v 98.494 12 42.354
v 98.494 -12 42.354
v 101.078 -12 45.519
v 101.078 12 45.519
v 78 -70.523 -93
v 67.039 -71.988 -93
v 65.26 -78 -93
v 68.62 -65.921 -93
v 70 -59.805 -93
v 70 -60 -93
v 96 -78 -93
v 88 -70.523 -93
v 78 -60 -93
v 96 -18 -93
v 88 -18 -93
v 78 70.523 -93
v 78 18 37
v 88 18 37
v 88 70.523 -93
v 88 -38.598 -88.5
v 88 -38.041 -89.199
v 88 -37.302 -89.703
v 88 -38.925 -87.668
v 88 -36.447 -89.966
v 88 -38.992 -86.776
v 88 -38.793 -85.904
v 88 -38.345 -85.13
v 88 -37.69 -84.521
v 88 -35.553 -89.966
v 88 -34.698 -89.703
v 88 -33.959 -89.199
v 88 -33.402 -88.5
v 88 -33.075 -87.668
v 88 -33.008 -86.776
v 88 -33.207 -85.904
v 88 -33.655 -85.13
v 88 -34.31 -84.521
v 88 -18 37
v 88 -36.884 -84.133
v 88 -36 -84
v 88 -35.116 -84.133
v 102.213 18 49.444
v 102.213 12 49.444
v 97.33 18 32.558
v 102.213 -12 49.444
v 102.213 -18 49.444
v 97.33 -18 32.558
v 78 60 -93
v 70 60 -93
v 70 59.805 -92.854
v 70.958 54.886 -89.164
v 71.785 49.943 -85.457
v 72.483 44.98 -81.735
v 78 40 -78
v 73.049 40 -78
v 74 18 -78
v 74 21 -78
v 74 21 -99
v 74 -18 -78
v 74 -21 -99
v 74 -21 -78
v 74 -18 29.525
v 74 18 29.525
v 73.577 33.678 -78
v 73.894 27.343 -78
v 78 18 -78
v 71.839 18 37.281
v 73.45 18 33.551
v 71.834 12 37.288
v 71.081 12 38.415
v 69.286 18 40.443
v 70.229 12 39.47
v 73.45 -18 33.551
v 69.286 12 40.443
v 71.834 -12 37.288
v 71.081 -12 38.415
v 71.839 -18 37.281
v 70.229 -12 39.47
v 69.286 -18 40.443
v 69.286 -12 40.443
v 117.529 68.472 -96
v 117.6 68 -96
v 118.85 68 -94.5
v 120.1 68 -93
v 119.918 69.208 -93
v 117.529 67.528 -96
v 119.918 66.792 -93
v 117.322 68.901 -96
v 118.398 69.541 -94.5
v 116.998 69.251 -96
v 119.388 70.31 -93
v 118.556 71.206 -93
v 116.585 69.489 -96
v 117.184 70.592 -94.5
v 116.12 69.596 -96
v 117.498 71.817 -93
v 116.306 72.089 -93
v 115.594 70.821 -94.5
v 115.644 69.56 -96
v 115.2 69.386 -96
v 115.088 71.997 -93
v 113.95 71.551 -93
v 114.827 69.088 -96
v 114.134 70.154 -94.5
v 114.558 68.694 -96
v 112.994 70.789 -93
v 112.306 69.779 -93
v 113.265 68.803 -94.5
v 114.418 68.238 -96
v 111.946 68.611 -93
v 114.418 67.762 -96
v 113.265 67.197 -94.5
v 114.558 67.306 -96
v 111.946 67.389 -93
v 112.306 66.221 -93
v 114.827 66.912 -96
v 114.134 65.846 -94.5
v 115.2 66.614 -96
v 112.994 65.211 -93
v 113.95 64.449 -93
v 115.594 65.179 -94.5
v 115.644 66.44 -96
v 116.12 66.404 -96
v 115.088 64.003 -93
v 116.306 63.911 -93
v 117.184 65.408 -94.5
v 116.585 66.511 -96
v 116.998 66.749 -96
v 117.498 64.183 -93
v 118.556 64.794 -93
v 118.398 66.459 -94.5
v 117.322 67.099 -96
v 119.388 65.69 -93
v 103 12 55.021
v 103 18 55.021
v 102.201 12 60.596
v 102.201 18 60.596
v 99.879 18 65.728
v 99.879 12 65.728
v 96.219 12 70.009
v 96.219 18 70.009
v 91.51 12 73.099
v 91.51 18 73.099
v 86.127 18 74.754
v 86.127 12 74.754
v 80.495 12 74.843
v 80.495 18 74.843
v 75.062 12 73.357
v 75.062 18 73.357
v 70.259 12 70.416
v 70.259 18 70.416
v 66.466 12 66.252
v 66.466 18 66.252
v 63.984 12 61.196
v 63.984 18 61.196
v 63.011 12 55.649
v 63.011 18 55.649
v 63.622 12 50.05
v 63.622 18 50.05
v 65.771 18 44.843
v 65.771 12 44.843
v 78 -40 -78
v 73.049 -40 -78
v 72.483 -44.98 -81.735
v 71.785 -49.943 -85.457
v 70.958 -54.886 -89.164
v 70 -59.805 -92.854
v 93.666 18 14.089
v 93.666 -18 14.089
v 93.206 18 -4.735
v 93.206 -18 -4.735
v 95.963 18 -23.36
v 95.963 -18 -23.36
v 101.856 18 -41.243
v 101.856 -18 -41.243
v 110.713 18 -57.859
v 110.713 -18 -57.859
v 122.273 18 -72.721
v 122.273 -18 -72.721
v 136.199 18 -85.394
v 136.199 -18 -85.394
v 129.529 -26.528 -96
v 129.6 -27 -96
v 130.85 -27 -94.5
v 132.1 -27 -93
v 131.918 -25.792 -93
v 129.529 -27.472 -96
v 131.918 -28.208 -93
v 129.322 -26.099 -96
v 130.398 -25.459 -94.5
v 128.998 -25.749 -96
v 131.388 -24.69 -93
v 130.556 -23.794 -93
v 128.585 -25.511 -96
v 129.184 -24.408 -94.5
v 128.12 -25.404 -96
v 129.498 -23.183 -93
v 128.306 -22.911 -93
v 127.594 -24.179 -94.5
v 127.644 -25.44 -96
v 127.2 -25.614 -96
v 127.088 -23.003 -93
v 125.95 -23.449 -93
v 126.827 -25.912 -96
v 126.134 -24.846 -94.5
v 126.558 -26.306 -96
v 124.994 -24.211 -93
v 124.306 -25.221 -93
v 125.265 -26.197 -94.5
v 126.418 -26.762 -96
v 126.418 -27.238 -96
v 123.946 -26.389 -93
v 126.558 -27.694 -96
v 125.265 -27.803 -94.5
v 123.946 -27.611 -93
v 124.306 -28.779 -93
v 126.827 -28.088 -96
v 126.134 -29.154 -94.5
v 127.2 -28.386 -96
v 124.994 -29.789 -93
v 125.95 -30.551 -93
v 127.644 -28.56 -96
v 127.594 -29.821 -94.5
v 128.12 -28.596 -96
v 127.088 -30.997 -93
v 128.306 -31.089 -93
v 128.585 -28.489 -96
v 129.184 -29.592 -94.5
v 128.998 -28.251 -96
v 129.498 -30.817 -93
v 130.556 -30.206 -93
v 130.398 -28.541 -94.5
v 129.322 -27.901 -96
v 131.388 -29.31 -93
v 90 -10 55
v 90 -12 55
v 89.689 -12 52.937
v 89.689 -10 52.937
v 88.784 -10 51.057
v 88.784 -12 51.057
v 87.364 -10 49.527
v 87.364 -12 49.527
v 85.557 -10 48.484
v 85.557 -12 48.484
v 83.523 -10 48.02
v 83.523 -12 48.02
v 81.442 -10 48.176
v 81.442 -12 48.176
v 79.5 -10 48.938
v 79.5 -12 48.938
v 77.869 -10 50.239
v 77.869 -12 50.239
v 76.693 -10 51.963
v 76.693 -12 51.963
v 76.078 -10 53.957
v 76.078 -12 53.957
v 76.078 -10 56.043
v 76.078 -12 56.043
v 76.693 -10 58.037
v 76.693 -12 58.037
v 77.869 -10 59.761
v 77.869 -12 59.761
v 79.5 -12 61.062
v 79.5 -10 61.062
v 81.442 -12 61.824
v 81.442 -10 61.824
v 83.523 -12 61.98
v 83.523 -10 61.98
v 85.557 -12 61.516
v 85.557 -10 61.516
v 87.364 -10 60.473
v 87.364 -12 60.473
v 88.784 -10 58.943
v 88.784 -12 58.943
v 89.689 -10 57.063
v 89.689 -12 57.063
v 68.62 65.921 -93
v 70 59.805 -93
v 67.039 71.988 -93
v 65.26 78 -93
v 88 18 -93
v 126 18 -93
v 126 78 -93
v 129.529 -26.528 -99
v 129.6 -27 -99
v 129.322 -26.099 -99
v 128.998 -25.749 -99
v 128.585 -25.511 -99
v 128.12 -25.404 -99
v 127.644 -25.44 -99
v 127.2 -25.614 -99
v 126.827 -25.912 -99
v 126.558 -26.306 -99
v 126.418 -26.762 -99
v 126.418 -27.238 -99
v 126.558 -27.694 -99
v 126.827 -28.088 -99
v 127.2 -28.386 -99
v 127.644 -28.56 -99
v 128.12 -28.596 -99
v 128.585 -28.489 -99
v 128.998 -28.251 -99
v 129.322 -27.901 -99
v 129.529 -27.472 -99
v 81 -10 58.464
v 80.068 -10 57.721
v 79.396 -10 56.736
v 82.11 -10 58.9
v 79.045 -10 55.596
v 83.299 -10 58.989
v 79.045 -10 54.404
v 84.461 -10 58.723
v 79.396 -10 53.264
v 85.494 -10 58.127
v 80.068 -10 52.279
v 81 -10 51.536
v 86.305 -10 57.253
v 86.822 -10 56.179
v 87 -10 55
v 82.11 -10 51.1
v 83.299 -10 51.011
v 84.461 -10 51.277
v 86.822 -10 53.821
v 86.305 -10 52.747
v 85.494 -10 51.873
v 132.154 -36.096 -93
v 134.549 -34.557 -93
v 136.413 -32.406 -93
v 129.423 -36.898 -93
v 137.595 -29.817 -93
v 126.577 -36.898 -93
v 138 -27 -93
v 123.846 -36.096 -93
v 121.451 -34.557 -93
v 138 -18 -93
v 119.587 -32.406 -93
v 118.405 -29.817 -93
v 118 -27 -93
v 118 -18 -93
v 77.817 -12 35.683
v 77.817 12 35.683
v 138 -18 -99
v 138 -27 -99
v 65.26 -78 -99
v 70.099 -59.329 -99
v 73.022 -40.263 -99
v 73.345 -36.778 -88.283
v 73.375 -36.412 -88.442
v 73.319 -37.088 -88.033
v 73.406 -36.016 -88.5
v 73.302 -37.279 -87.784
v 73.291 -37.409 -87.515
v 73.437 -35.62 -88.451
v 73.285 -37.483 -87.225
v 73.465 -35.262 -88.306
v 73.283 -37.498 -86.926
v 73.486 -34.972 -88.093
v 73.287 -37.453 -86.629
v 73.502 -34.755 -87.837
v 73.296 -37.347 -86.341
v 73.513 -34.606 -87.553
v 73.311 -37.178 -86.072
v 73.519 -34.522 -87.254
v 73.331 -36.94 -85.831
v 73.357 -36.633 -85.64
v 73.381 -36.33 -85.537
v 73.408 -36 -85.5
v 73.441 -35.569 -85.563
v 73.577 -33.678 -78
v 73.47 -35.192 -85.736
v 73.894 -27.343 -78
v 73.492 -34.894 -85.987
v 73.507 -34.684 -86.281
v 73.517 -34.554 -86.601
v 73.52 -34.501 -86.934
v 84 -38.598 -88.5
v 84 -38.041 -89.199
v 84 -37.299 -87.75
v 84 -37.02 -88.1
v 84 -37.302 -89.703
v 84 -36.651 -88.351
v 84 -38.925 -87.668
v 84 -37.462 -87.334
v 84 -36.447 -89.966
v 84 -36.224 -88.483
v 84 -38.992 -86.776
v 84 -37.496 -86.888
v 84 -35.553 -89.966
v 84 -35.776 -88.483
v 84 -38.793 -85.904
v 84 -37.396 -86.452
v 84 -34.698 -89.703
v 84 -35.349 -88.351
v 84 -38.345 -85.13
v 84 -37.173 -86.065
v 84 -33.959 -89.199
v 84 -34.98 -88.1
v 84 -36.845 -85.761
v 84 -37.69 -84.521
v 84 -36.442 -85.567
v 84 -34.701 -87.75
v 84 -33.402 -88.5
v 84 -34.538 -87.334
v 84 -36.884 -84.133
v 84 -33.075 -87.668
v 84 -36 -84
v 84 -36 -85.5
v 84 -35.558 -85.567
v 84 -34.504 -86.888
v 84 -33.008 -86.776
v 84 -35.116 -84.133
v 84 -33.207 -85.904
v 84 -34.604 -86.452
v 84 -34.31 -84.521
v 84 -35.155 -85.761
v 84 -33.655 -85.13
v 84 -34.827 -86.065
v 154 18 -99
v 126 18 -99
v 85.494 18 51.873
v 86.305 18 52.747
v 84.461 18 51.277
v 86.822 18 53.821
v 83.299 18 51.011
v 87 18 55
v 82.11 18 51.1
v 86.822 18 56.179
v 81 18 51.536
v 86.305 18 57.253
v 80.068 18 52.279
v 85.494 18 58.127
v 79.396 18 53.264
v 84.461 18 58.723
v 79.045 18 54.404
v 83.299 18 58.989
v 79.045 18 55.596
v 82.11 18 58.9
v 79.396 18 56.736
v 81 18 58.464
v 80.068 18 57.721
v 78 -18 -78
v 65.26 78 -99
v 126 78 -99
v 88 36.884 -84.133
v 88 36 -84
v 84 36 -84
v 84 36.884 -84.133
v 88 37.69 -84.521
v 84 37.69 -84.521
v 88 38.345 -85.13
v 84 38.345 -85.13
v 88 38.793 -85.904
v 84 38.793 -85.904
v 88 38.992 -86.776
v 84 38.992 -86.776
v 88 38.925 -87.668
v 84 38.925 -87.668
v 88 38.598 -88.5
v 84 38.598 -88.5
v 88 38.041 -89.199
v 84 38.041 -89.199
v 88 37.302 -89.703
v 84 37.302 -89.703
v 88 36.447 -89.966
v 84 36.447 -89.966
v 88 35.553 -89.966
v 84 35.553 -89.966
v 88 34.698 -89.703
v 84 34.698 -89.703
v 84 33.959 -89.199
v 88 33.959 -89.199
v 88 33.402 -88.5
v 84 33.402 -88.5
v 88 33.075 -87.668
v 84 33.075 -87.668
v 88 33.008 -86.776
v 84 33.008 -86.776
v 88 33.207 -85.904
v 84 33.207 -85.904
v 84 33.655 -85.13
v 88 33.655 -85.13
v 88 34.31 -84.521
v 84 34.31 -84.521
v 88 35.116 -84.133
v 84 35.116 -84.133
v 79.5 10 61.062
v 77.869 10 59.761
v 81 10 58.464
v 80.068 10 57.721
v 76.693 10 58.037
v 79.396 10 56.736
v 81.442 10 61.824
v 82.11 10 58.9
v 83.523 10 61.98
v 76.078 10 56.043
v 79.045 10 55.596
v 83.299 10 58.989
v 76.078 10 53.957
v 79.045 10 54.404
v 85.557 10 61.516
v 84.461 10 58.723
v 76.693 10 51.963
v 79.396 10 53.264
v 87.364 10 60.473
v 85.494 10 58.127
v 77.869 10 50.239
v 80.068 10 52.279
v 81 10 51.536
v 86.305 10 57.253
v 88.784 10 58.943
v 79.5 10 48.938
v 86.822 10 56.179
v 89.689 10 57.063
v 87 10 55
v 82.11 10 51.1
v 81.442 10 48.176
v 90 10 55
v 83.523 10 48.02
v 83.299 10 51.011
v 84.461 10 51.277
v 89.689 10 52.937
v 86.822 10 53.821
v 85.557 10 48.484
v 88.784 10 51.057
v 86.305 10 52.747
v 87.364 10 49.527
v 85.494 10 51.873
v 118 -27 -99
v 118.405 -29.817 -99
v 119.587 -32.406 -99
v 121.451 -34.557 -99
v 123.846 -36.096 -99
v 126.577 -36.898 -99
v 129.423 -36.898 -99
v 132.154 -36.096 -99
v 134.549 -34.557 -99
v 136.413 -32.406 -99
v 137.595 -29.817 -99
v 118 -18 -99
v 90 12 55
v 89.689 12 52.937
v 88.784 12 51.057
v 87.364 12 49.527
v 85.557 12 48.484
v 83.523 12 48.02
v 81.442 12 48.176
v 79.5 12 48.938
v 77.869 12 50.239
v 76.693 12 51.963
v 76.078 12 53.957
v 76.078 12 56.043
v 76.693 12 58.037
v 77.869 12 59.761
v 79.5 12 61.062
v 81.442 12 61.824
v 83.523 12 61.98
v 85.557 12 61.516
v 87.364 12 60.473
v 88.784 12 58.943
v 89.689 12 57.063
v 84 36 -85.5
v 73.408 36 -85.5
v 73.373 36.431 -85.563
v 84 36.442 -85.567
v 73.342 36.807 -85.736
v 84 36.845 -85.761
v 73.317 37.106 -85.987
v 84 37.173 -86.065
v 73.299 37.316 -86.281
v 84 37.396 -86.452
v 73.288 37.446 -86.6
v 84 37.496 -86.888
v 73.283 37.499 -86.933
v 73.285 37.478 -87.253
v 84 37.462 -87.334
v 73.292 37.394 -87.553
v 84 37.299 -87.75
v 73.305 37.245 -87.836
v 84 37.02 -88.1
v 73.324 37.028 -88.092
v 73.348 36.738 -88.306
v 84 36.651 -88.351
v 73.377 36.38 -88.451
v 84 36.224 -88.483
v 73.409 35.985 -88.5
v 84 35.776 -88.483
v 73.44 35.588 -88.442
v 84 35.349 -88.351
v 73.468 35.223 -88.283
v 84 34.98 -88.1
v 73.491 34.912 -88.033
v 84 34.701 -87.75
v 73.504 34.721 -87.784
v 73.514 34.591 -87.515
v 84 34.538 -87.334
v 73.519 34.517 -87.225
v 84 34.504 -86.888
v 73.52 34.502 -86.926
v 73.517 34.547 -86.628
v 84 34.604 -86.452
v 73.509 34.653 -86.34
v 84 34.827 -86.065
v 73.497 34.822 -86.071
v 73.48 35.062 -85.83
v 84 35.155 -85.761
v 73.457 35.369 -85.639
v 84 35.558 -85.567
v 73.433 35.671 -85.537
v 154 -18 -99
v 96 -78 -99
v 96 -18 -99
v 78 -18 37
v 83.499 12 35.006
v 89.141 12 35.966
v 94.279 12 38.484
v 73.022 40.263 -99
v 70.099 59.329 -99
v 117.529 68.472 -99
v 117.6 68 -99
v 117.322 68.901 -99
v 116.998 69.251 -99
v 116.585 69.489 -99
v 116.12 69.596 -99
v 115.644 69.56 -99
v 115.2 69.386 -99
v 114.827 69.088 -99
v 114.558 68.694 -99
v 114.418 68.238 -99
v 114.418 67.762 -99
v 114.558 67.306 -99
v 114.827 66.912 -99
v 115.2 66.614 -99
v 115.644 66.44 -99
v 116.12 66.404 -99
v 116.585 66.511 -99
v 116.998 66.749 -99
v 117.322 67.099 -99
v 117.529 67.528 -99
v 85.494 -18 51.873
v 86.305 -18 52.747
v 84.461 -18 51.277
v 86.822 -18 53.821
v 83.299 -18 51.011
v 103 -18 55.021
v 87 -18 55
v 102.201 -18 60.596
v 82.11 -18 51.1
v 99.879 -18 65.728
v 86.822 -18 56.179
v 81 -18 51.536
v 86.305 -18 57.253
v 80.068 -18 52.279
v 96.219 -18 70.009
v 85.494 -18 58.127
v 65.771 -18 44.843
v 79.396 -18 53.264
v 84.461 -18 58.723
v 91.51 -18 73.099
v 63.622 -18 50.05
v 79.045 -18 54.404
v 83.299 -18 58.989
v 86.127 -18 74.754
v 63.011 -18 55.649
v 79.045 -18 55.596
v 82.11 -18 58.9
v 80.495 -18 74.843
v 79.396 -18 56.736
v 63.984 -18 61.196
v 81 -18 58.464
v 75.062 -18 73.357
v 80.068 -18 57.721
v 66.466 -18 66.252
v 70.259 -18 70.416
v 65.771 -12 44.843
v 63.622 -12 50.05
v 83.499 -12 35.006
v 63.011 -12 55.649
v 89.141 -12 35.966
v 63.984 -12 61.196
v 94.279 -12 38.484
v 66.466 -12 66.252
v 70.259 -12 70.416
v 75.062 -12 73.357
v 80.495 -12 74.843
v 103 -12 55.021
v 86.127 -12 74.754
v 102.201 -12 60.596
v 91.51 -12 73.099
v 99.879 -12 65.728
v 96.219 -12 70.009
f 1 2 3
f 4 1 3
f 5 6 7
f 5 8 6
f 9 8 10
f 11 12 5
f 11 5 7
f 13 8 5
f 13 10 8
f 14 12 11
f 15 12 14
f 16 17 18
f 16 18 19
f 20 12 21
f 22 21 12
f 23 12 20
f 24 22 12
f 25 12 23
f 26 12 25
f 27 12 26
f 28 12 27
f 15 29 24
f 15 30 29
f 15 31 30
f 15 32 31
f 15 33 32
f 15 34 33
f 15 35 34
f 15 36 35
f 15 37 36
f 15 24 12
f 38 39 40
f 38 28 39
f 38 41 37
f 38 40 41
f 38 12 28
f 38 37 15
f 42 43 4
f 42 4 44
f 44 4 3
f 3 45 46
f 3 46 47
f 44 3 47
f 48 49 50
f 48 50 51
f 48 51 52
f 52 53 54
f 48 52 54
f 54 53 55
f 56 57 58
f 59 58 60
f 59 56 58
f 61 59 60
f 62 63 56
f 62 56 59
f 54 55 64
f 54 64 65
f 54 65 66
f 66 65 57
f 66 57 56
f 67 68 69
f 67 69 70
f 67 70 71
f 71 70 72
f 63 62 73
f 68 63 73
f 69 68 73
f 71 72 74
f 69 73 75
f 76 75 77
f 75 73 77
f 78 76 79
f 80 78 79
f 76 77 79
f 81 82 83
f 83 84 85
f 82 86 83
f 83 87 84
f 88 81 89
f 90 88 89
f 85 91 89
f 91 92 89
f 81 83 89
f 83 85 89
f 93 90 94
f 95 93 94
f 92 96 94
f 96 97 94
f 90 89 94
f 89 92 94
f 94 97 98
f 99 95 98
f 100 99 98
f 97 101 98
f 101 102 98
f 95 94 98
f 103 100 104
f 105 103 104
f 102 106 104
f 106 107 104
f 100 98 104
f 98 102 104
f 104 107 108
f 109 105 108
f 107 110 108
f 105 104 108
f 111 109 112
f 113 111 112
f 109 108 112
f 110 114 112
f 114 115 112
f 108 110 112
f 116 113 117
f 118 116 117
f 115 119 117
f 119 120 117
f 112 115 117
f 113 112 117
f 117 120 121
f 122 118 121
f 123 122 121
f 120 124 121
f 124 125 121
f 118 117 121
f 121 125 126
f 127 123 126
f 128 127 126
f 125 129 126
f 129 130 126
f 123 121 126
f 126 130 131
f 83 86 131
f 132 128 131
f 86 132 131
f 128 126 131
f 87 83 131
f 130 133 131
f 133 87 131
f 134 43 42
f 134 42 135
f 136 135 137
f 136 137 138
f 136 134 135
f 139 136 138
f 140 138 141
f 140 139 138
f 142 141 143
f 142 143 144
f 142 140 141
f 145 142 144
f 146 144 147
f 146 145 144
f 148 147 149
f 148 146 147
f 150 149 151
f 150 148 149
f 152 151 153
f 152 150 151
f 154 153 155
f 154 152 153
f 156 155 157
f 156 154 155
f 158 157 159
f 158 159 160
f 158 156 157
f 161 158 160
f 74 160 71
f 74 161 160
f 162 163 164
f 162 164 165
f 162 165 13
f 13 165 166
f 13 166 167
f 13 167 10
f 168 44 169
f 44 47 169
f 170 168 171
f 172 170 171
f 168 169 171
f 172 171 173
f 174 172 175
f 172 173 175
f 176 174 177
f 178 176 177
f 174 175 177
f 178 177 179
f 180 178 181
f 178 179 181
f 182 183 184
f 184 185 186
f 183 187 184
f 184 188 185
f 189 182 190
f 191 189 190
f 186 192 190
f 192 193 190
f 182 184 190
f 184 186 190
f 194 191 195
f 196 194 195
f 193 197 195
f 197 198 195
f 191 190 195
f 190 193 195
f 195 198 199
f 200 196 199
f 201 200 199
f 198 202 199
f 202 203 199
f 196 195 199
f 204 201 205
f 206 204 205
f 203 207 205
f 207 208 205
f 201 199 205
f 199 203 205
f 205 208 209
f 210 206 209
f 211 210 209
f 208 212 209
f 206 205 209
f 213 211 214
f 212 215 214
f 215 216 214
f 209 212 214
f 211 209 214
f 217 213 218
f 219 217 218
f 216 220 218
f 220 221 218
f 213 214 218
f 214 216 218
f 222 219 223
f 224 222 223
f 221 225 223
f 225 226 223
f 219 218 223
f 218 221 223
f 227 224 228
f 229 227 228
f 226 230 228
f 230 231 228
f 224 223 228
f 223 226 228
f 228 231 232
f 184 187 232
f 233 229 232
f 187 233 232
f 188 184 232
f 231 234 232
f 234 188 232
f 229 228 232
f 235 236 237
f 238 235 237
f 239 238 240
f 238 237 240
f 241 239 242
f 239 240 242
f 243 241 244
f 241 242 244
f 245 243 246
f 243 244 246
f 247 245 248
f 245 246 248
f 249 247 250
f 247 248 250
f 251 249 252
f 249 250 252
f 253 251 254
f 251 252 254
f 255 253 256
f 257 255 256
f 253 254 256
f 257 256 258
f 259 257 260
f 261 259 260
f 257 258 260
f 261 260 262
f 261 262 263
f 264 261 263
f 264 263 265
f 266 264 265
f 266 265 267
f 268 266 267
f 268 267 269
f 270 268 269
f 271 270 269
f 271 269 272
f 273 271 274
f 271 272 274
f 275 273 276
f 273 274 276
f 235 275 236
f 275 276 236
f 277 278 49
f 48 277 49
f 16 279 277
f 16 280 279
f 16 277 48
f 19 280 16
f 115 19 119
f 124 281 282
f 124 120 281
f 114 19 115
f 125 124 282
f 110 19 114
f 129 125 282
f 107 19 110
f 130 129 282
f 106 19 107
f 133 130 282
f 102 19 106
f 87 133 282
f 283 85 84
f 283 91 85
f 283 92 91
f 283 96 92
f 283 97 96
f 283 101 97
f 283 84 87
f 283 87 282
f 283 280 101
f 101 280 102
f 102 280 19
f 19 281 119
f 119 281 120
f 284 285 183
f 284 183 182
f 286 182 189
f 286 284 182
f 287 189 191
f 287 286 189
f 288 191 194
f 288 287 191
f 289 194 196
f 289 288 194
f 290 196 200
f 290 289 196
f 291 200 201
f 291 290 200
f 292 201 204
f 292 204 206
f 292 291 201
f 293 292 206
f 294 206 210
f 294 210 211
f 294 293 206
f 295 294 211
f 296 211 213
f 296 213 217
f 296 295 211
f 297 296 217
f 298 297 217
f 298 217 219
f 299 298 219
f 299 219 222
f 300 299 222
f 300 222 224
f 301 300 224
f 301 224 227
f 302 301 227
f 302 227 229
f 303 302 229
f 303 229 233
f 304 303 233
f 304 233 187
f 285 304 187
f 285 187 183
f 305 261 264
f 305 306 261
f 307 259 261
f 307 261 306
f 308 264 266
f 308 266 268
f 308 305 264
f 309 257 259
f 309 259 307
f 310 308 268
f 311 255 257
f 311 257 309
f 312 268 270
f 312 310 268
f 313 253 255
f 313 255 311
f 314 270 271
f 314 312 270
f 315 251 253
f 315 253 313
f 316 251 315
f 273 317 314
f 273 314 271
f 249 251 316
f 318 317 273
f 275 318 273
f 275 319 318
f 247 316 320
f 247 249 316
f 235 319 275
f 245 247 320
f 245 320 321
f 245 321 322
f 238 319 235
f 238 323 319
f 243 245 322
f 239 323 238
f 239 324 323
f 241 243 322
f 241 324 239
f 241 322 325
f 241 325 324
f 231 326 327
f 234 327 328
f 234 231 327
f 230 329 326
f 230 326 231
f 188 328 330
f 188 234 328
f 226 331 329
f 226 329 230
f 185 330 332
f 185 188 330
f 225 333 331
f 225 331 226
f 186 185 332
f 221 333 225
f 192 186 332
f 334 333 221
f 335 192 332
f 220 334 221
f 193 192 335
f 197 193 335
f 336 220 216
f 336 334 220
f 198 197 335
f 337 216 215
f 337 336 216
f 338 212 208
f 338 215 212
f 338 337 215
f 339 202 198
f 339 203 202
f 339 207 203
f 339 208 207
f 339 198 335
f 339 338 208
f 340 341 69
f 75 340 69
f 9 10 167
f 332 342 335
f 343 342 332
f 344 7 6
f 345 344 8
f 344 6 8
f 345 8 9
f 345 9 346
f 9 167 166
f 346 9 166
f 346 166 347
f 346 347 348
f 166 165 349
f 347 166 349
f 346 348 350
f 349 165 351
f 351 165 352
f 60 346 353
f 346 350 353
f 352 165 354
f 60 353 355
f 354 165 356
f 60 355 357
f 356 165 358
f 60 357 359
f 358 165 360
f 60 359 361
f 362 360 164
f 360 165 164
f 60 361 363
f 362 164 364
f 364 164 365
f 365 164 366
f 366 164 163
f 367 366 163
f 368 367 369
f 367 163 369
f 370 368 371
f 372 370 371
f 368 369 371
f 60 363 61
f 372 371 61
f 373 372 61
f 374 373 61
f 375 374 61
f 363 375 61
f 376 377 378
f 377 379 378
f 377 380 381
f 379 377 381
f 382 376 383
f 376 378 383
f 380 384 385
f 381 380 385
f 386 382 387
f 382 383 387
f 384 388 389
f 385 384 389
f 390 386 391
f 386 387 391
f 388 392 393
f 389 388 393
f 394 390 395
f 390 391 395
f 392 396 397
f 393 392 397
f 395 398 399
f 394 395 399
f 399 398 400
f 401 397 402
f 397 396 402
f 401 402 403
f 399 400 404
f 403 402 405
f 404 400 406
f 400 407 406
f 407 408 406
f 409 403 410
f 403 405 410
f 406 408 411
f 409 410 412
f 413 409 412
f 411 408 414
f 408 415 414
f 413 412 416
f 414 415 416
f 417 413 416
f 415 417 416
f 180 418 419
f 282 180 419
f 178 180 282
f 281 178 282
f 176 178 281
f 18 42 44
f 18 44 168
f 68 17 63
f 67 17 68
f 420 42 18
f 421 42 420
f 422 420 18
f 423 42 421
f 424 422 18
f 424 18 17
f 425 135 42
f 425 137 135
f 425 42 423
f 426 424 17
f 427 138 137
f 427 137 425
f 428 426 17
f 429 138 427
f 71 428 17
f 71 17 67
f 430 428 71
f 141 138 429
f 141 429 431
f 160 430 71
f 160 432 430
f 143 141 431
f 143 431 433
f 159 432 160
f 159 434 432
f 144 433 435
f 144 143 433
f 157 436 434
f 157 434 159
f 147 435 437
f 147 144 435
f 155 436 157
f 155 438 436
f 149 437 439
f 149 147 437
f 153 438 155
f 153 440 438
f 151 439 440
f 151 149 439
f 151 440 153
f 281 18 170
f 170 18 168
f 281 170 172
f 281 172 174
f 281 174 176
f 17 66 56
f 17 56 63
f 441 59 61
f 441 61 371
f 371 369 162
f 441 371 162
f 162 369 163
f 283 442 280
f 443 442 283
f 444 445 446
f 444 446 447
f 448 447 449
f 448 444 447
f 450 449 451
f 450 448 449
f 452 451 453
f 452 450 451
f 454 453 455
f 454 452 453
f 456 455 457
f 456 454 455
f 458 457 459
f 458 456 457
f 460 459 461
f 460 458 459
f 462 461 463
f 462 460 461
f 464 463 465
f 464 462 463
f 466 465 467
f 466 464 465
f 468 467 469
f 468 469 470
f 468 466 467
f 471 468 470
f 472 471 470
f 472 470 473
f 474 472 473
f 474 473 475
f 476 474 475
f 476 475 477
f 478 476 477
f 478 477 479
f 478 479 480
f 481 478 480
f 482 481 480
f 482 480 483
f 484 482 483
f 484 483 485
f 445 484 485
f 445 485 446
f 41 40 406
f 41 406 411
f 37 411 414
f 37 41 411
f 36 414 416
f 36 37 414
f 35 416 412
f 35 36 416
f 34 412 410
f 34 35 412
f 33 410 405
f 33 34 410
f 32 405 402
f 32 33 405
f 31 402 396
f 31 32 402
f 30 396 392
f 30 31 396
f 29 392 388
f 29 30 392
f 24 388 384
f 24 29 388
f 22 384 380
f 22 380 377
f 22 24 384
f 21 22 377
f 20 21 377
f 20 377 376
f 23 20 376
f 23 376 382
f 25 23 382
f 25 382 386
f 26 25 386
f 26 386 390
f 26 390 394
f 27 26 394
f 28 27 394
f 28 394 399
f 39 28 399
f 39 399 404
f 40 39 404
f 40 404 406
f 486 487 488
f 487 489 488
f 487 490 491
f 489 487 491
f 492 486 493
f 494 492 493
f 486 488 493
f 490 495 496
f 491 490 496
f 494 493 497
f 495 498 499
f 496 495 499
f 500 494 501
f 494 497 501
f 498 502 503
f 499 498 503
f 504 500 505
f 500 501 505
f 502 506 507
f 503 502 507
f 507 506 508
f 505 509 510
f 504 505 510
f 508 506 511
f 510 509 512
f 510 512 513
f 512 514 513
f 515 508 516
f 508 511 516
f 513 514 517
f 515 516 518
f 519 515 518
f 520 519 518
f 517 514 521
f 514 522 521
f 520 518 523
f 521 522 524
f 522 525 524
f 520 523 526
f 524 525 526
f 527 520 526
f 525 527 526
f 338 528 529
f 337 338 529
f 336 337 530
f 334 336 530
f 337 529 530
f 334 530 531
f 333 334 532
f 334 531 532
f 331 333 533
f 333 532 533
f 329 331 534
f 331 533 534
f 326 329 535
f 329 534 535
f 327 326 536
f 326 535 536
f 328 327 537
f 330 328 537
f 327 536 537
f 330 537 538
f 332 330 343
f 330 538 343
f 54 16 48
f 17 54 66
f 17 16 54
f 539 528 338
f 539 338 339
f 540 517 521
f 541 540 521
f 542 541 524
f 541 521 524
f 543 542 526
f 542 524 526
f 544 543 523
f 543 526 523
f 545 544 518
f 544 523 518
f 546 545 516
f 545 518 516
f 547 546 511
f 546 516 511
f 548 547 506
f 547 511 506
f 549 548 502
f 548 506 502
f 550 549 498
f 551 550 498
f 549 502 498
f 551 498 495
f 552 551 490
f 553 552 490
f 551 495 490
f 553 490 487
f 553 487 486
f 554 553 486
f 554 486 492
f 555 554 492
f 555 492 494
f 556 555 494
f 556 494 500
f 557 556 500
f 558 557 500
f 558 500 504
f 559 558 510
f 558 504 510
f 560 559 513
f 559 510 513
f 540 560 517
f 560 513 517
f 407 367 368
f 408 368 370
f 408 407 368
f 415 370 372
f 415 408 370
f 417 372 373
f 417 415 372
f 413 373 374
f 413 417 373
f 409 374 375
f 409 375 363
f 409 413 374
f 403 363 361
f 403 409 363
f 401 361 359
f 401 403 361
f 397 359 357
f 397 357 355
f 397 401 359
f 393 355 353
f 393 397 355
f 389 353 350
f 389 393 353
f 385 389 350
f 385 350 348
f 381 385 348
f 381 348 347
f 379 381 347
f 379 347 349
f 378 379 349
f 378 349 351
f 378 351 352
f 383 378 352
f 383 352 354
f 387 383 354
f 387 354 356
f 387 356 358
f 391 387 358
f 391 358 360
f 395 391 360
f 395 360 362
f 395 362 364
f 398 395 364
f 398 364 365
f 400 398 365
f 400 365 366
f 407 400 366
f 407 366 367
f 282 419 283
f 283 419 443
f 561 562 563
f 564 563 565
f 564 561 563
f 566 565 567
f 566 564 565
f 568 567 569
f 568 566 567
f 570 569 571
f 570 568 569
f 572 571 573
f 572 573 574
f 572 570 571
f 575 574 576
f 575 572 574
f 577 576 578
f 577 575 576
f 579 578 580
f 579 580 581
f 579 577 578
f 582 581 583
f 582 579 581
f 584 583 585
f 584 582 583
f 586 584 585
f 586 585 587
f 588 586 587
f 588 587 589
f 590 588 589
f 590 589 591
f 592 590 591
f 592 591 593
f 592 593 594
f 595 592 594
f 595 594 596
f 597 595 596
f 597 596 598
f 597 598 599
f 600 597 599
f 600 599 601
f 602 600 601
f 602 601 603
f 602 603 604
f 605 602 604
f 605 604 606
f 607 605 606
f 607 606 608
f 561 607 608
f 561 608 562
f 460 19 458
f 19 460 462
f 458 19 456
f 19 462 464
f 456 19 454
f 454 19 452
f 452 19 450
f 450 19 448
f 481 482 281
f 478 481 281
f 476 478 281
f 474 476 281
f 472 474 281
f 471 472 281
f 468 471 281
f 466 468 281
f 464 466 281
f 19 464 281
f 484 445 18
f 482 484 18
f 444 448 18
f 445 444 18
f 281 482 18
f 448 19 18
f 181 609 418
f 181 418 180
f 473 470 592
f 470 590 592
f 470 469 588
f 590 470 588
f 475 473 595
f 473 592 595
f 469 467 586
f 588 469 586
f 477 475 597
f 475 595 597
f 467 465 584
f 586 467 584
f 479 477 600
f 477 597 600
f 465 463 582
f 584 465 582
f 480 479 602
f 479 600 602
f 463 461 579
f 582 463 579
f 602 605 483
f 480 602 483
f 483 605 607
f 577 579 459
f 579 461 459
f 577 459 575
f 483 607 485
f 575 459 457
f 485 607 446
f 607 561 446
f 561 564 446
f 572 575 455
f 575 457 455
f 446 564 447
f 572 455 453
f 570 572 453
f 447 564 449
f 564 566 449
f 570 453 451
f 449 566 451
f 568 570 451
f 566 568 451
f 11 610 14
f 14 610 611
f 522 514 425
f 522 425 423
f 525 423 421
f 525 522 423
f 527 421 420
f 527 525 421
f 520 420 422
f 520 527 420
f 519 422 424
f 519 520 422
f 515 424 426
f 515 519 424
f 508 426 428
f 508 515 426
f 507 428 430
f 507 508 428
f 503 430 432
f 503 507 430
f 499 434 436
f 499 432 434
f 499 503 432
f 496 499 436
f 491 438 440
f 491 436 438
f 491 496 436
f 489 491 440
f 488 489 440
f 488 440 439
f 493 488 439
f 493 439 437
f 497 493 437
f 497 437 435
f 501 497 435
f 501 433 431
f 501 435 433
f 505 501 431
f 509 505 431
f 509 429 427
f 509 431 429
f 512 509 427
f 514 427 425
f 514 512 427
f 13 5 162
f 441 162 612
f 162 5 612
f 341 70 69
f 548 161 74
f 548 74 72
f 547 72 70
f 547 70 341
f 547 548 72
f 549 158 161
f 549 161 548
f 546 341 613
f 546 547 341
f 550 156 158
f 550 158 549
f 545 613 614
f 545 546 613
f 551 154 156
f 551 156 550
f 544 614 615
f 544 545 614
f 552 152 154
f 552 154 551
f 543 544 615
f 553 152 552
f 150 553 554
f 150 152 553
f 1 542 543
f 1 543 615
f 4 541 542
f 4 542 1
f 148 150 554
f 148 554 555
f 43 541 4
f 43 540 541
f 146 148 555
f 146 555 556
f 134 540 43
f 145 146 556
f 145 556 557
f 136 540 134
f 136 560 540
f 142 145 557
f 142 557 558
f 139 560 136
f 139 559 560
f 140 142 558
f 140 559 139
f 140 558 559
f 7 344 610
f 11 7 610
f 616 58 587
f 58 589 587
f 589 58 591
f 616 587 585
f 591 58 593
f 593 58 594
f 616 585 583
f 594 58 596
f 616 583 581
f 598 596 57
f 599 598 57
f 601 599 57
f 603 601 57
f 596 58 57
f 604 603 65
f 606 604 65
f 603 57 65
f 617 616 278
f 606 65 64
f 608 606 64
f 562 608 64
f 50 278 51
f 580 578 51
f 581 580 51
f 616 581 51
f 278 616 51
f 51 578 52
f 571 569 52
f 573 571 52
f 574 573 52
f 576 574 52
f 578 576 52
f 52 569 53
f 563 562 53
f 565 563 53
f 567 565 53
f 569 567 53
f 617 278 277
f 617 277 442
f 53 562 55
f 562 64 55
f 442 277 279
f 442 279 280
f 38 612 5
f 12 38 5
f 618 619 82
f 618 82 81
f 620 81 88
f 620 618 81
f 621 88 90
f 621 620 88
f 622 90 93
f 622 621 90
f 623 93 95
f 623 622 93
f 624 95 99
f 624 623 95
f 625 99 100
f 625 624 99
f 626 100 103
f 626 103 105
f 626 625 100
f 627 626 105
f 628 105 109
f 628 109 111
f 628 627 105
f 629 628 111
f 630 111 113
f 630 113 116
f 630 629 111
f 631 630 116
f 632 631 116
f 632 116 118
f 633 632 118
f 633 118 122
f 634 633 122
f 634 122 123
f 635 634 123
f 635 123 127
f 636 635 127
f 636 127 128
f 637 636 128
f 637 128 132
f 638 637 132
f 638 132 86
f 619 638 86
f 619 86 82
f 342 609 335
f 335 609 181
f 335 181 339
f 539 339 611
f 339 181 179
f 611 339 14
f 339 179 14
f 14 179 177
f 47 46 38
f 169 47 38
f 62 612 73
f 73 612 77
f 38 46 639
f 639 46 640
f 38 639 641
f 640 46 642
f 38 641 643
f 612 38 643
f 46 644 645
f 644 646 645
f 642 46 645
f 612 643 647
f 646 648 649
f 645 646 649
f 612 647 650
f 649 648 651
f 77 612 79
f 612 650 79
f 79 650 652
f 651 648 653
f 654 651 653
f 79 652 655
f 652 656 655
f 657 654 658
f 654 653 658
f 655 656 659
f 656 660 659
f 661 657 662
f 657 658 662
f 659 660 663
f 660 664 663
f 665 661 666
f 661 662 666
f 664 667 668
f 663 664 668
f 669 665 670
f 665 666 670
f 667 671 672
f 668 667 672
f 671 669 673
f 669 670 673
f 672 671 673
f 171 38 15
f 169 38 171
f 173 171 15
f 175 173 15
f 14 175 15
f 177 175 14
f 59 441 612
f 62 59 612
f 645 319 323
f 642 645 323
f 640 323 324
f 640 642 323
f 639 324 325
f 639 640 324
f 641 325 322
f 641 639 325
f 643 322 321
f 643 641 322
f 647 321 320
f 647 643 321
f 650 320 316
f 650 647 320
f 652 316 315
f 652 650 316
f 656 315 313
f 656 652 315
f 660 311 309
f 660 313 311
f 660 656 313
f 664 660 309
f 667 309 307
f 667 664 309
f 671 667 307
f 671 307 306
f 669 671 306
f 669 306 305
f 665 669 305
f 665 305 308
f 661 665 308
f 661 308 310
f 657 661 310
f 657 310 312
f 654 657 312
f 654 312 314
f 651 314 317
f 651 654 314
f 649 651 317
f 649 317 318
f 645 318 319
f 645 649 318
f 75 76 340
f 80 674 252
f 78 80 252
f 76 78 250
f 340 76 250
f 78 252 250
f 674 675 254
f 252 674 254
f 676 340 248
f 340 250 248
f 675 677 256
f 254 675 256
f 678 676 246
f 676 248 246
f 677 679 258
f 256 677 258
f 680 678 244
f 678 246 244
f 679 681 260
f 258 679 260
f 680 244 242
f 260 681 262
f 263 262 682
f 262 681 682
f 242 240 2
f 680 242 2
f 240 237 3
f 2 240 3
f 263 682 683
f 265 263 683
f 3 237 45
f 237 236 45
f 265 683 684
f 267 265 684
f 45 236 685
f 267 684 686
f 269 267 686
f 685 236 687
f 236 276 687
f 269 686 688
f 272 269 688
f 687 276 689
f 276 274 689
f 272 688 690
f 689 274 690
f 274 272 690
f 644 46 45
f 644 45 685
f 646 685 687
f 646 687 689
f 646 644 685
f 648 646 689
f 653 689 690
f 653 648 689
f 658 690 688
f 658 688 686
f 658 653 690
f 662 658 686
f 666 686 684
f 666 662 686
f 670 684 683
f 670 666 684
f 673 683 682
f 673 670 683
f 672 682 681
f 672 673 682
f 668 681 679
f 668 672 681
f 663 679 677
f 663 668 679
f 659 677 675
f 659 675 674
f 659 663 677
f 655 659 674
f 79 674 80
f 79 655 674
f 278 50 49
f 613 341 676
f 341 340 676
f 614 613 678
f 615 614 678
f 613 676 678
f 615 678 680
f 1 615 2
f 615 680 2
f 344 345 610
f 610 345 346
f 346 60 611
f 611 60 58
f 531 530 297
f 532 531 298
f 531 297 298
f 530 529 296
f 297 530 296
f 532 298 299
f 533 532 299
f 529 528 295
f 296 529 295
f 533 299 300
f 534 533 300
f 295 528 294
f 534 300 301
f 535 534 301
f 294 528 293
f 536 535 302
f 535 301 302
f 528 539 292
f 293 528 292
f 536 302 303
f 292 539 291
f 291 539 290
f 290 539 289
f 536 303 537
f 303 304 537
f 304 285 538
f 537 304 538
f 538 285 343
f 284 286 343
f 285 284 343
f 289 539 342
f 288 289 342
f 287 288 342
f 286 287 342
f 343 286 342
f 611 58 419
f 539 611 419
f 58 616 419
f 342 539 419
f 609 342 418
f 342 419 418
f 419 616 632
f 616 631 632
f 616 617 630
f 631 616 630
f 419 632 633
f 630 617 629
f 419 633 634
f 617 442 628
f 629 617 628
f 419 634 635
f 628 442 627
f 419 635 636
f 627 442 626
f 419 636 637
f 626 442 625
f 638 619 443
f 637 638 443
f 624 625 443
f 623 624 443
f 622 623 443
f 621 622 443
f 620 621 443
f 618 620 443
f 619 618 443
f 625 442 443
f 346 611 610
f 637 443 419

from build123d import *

# Parameters (mm, degrees)
CYLINDER059_R              = 1.5
CYLINDER059_DEPTH          = 45
CYLINDER060_R              = 1.5
CYLINDER060_DEPTH          = 45
PRISM006_DEPTH             = 3
PRISM007_DEPTH             = 3
CYLINDER061_R              = 3
CYLINDER061_DEPTH          = 5
CYLINDER043_R              = 4
CYLINDER043_DEPTH          = 40
CYLINDER045_R              = 7
CYLINDER045_DEPTH          = 2
CYLINDER044_R              = 7
CYLINDER044_DEPTH          = 2
EXTRUDE010_DEPTH           = 12
EXTRUDE023_DEPTH           = 24
CYLINDER046_R              = 1.6
CYLINDER046_DEPTH          = 10
CYLINDER062_R              = 3
CYLINDER062_DEPTH          = 5
BOX012_W                   = 31
BOX012_H                   = 60
BOX012_DEPTH               = 6
BOX011_W                   = 61
BOX011_H                   = 60
BOX011_DEPTH               = 6
EXTRUDE015_DEPTH           = 6
EXTRUDE015_PLACEMENT_ANGLE = 90
EXTRUDE011_DEPTH           = 10
EXTRUDE024_DEPTH           = 10
EXTRUDE009_DEPTH           = 18


with BuildPart() as cilindro059:
    # Cylinder059 → Cylinder059 (new body)
    with BuildSketch(Plane(origin=(98, -36, -87), x_dir=(0, 0, 1), z_dir=(-1, 0, 0))):
        Circle(CYLINDER059_R)
    extrude(amount=CYLINDER059_DEPTH)


with BuildPart() as cilindro060:
    # Cylinder060 → Cylinder060 (new body)
    with BuildSketch(Plane(origin=(98, 36, -87), x_dir=(0, 0, 1), z_dir=(-1, 0, 0))):
        Circle(CYLINDER060_R)
    extrude(amount=CYLINDER060_DEPTH)


with BuildPart() as prisma006:
    # Prism006 → Prism006 (new body)
    with BuildSketch(Plane(origin=(65, -36, -87), x_dir=(0, 0, 1), z_dir=(-1, 0, 0))):
        Polygon((3, 0), (1.5, 2.598076), (-1.5, 2.598076), (-3, 0), (-1.5, -2.598076), (1.5, -2.598076), align=None)
    extrude(amount=PRISM006_DEPTH)


with BuildPart() as prisma007:
    # Prism007 → Prism007 (new body)
    with BuildSketch(Plane(origin=(65, 36, -87), x_dir=(0, 0, 1), z_dir=(-1, 0, 0))):
        Polygon((3, 0), (1.5, 2.598076), (-1.5, 2.598076), (-3, 0), (-1.5, -2.598076), (1.5, -2.598076), align=None)
    extrude(amount=PRISM007_DEPTH)


with BuildPart() as cilindro061:
    # Cylinder061 → Cylinder061 (new body)
    with BuildSketch(Plane(origin=(89, -36, -87), x_dir=(0, 0, 1), z_dir=(-1, 0, 0))):
        Circle(CYLINDER061_R)
    extrude(amount=CYLINDER061_DEPTH)


with BuildPart() as cilindro043:
    # Cylinder043 → Cylinder043 (new body)
    with BuildSketch(Plane(origin=(83, -20, 55), x_dir=(1, 0, 0), z_dir=(0, 1, 0))):
        Circle(CYLINDER043_R)
    extrude(amount=CYLINDER043_DEPTH)


with BuildPart() as cilindro045:
    # Cylinder045 → Cylinder045 (new body)
    with BuildSketch(Plane(origin=(83, 10, 55), x_dir=(1, 0, 0), z_dir=(0, 1, 0))):
        Circle(CYLINDER045_R)
    extrude(amount=CYLINDER045_DEPTH)


with BuildPart() as fusion020:
    # Cylinder044 → Cylinder044 (new body)
    with BuildSketch(Plane(origin=(83, -12, 55), x_dir=(1, 0, 0), z_dir=(0, 1, 0))):
        Circle(CYLINDER044_R)
    extrude(amount=CYLINDER044_DEPTH)

    # Fusion020: union Cilindro045
    add(cilindro045.part)


with BuildPart() as cut012:
    # Sketch010 → Extrude010 (new body, symmetric)
    with BuildSketch(Plane.XZ):
        with BuildLine():
            ThreePointArc((77.817442, 35.68314), (89.140517, 35.965977), (98.494144, 42.353597))
            Line((98.494144, 42.353597), (108, 54))
            Line((108, 54), (108, 85))
            Line((58, 85), (108, 85))
            Line((58, 41), (58, 85))
            Line((77.817442, 35.68314), (58, 41))
        make_face()
    extrude(amount=EXTRUDE010_DEPTH, both=True)

    # Cut012: cut Fusion020
    add(fusion020.part, mode=Mode.SUBTRACT)


with BuildPart() as extrude023:
    # Sketch015 → Extrude023 (new body)
    with BuildSketch(Plane.XY.offset(-75)):
        with BuildLine():
            Line((-74, 21), (-74, -21))
            ThreePointArc((-74, -21), (-67.384986, -70.729267), (-48, -117))
            Line((-48, -117), (48, -117))
            ThreePointArc((48, -117), (67.384986, -70.729267), (74, -21))
            Line((74, 21), (74, -21))
            ThreePointArc((74, 21), (67.384986, 70.729267), (48, 117))
            Line((-48, 117), (48, 117))
            ThreePointArc((-48, 117), (-67.384986, 70.729267), (-74, 21))
        make_face()
    extrude(amount=-EXTRUDE023_DEPTH)


with BuildPart() as cono:
    # Cone → Cone (revolve)
    with BuildSketch(Plane(origin=(0, 0, -96), x_dir=(1, 0, 0), z_dir=(0, -1, 0))):
        Polygon((0, 0), (1.6, 0), (4.1, 3), (0, 3), align=None)
    revolve(axis=Axis((0, 0, -96), (0, 0, 1)))


with BuildPart() as cilindro046:
    # Cylinder046 → Cylinder046 (new body)
    with BuildSketch(Plane.XY.offset(-106)):
        Circle(CYLINDER046_R)
    extrude(amount=CYLINDER046_DEPTH)


with BuildPart() as fusion029:
    # Fusion029 base: copy of Cilindro046
    add(cilindro046.part)

    # Fusion029: union Cono
    add(cono.part)


with BuildPart() as fusion029_1:
    # Fusion029 placement: moved
    add(fusion029.part.moved(Location((128, -27, 0))))


with BuildPart() as fusion028:
    # Fusion028 base: copy of Cilindro046
    add(cilindro046.part)

    # Fusion028: union Cono
    add(cono.part)


with BuildPart() as fusion028_1:
    # Fusion028 placement: moved
    add(fusion028.part.moved(Location((116, 68, 0))))


with BuildPart() as fusion052:
    # Cylinder062 → Cylinder062 (new body)
    with BuildSketch(Plane(origin=(89, 36, -87), x_dir=(0, 0, 1), z_dir=(-1, 0, 0))):
        Circle(CYLINDER062_R)
    extrude(amount=CYLINDER062_DEPTH)

    # Fusion052: union Cilindro059, Cilindro060, Prisma006, Prisma007, Cilindro061, Cilindro043, Cut012, Extrude023, Fusion029, Fusion028
    add(cilindro059.part)
    add(cilindro060.part)
    add(prisma006.part)
    add(prisma007.part)
    add(cilindro061.part)
    add(cilindro043.part)
    add(cut012.part)
    add(extrude023.part)
    add(fusion029_1.part)
    add(fusion028_1.part)


with BuildPart() as cubo011:
    # Box012 → Box012 (new body)
    with BuildSketch(Plane(origin=(65, -78, -99), x_dir=(1, 0, 0), z_dir=(0, 0, 1))):
        with Locations((15.5, 30)):
            Rectangle(BOX012_W, BOX012_H)
    extrude(amount=BOX012_DEPTH)


with BuildPart() as cubo010:
    # Box011 → Box011 (new body)
    with BuildSketch(Plane(origin=(65, 18, -99), x_dir=(1, 0, 0), z_dir=(0, 0, 1))):
        with Locations((30.5, 30)):
            Rectangle(BOX011_W, BOX011_H)
    extrude(amount=BOX011_DEPTH)


with BuildPart() as fusion024:
    # Sketch012 → Extrude015 (new body)
    with BuildSketch(Plane.XY.offset(-99)):
        with BuildLine():
            ThreePointArc((0, 10), (-10, 0), (0, -10))
            Line((20, -10), (0, -10))
            Line((20, 10), (20, -10))
            Line((0, 10), (20, 10))
        make_face()
    extrude(amount=EXTRUDE015_DEPTH)


with BuildPart() as fusion024_1:
    # Extrude015 placement: moved
    add(fusion024.part.moved(Location((128, -27, 0))).rotate(Axis((128, -27, 0), (0, 0, 1)), EXTRUDE015_PLACEMENT_ANGLE))

    # Fusion024: union Cubo011, Cubo010
    add(cubo011.part)
    add(cubo010.part)


with BuildPart() as extrude011:
    # Sketch011 → Extrude011 (new body)
    with BuildSketch(Plane.YZ.offset(78)):
        Polygon((-70.523409, -93), (-18, -93), (-18, 37), align=None)
        Polygon((18, -93), (18, 37), (70.523409, -93), align=None)
    extrude(amount=EXTRUDE011_DEPTH)


with BuildPart() as extrude024:
    # Sketch016 → Extrude024 (new body)
    with BuildSketch(Plane.YZ.offset(70)):
        Polygon((-40, -78), (-60, -93), (60, -93), (40, -78), align=None)
    extrude(amount=EXTRUDE024_DEPTH)


with BuildPart() as soporte_eje:
    # Sketch009 → Extrude009 (new body, symmetric)
    with BuildSketch(Plane.XZ):
        with BuildLine():
            Line((74, -99), (74, 29.524522))
            ThreePointArc((74, 29.524522), (72.771088, 35.470709), (69.285714, 40.442584))
            ThreePointArc((102.212801, 49.444079), (77.725993, 74.292093), (69.285714, 40.442584))
            Line((102.212801, 49.444079), (97.329592, 32.557567))
            ThreePointArc((97.329592, 32.557567), (98.526548, -32.428153), (136.199214, -85.393678))
            Line((154, -99), (136.199214, -85.393678))
            Line((74, -99), (154, -99))
        make_face()
    extrude(amount=EXTRUDE009_DEPTH, both=True)

    # Fusion053: union Fusion024, Extrude011, Extrude024
    add(fusion024_1.part)
    add(extrude011.part)
    add(extrude024.part)

    # Cut020: cut Fusion052
    add(fusion052.part, mode=Mode.SUBTRACT)


solid = soporte_eje.part
